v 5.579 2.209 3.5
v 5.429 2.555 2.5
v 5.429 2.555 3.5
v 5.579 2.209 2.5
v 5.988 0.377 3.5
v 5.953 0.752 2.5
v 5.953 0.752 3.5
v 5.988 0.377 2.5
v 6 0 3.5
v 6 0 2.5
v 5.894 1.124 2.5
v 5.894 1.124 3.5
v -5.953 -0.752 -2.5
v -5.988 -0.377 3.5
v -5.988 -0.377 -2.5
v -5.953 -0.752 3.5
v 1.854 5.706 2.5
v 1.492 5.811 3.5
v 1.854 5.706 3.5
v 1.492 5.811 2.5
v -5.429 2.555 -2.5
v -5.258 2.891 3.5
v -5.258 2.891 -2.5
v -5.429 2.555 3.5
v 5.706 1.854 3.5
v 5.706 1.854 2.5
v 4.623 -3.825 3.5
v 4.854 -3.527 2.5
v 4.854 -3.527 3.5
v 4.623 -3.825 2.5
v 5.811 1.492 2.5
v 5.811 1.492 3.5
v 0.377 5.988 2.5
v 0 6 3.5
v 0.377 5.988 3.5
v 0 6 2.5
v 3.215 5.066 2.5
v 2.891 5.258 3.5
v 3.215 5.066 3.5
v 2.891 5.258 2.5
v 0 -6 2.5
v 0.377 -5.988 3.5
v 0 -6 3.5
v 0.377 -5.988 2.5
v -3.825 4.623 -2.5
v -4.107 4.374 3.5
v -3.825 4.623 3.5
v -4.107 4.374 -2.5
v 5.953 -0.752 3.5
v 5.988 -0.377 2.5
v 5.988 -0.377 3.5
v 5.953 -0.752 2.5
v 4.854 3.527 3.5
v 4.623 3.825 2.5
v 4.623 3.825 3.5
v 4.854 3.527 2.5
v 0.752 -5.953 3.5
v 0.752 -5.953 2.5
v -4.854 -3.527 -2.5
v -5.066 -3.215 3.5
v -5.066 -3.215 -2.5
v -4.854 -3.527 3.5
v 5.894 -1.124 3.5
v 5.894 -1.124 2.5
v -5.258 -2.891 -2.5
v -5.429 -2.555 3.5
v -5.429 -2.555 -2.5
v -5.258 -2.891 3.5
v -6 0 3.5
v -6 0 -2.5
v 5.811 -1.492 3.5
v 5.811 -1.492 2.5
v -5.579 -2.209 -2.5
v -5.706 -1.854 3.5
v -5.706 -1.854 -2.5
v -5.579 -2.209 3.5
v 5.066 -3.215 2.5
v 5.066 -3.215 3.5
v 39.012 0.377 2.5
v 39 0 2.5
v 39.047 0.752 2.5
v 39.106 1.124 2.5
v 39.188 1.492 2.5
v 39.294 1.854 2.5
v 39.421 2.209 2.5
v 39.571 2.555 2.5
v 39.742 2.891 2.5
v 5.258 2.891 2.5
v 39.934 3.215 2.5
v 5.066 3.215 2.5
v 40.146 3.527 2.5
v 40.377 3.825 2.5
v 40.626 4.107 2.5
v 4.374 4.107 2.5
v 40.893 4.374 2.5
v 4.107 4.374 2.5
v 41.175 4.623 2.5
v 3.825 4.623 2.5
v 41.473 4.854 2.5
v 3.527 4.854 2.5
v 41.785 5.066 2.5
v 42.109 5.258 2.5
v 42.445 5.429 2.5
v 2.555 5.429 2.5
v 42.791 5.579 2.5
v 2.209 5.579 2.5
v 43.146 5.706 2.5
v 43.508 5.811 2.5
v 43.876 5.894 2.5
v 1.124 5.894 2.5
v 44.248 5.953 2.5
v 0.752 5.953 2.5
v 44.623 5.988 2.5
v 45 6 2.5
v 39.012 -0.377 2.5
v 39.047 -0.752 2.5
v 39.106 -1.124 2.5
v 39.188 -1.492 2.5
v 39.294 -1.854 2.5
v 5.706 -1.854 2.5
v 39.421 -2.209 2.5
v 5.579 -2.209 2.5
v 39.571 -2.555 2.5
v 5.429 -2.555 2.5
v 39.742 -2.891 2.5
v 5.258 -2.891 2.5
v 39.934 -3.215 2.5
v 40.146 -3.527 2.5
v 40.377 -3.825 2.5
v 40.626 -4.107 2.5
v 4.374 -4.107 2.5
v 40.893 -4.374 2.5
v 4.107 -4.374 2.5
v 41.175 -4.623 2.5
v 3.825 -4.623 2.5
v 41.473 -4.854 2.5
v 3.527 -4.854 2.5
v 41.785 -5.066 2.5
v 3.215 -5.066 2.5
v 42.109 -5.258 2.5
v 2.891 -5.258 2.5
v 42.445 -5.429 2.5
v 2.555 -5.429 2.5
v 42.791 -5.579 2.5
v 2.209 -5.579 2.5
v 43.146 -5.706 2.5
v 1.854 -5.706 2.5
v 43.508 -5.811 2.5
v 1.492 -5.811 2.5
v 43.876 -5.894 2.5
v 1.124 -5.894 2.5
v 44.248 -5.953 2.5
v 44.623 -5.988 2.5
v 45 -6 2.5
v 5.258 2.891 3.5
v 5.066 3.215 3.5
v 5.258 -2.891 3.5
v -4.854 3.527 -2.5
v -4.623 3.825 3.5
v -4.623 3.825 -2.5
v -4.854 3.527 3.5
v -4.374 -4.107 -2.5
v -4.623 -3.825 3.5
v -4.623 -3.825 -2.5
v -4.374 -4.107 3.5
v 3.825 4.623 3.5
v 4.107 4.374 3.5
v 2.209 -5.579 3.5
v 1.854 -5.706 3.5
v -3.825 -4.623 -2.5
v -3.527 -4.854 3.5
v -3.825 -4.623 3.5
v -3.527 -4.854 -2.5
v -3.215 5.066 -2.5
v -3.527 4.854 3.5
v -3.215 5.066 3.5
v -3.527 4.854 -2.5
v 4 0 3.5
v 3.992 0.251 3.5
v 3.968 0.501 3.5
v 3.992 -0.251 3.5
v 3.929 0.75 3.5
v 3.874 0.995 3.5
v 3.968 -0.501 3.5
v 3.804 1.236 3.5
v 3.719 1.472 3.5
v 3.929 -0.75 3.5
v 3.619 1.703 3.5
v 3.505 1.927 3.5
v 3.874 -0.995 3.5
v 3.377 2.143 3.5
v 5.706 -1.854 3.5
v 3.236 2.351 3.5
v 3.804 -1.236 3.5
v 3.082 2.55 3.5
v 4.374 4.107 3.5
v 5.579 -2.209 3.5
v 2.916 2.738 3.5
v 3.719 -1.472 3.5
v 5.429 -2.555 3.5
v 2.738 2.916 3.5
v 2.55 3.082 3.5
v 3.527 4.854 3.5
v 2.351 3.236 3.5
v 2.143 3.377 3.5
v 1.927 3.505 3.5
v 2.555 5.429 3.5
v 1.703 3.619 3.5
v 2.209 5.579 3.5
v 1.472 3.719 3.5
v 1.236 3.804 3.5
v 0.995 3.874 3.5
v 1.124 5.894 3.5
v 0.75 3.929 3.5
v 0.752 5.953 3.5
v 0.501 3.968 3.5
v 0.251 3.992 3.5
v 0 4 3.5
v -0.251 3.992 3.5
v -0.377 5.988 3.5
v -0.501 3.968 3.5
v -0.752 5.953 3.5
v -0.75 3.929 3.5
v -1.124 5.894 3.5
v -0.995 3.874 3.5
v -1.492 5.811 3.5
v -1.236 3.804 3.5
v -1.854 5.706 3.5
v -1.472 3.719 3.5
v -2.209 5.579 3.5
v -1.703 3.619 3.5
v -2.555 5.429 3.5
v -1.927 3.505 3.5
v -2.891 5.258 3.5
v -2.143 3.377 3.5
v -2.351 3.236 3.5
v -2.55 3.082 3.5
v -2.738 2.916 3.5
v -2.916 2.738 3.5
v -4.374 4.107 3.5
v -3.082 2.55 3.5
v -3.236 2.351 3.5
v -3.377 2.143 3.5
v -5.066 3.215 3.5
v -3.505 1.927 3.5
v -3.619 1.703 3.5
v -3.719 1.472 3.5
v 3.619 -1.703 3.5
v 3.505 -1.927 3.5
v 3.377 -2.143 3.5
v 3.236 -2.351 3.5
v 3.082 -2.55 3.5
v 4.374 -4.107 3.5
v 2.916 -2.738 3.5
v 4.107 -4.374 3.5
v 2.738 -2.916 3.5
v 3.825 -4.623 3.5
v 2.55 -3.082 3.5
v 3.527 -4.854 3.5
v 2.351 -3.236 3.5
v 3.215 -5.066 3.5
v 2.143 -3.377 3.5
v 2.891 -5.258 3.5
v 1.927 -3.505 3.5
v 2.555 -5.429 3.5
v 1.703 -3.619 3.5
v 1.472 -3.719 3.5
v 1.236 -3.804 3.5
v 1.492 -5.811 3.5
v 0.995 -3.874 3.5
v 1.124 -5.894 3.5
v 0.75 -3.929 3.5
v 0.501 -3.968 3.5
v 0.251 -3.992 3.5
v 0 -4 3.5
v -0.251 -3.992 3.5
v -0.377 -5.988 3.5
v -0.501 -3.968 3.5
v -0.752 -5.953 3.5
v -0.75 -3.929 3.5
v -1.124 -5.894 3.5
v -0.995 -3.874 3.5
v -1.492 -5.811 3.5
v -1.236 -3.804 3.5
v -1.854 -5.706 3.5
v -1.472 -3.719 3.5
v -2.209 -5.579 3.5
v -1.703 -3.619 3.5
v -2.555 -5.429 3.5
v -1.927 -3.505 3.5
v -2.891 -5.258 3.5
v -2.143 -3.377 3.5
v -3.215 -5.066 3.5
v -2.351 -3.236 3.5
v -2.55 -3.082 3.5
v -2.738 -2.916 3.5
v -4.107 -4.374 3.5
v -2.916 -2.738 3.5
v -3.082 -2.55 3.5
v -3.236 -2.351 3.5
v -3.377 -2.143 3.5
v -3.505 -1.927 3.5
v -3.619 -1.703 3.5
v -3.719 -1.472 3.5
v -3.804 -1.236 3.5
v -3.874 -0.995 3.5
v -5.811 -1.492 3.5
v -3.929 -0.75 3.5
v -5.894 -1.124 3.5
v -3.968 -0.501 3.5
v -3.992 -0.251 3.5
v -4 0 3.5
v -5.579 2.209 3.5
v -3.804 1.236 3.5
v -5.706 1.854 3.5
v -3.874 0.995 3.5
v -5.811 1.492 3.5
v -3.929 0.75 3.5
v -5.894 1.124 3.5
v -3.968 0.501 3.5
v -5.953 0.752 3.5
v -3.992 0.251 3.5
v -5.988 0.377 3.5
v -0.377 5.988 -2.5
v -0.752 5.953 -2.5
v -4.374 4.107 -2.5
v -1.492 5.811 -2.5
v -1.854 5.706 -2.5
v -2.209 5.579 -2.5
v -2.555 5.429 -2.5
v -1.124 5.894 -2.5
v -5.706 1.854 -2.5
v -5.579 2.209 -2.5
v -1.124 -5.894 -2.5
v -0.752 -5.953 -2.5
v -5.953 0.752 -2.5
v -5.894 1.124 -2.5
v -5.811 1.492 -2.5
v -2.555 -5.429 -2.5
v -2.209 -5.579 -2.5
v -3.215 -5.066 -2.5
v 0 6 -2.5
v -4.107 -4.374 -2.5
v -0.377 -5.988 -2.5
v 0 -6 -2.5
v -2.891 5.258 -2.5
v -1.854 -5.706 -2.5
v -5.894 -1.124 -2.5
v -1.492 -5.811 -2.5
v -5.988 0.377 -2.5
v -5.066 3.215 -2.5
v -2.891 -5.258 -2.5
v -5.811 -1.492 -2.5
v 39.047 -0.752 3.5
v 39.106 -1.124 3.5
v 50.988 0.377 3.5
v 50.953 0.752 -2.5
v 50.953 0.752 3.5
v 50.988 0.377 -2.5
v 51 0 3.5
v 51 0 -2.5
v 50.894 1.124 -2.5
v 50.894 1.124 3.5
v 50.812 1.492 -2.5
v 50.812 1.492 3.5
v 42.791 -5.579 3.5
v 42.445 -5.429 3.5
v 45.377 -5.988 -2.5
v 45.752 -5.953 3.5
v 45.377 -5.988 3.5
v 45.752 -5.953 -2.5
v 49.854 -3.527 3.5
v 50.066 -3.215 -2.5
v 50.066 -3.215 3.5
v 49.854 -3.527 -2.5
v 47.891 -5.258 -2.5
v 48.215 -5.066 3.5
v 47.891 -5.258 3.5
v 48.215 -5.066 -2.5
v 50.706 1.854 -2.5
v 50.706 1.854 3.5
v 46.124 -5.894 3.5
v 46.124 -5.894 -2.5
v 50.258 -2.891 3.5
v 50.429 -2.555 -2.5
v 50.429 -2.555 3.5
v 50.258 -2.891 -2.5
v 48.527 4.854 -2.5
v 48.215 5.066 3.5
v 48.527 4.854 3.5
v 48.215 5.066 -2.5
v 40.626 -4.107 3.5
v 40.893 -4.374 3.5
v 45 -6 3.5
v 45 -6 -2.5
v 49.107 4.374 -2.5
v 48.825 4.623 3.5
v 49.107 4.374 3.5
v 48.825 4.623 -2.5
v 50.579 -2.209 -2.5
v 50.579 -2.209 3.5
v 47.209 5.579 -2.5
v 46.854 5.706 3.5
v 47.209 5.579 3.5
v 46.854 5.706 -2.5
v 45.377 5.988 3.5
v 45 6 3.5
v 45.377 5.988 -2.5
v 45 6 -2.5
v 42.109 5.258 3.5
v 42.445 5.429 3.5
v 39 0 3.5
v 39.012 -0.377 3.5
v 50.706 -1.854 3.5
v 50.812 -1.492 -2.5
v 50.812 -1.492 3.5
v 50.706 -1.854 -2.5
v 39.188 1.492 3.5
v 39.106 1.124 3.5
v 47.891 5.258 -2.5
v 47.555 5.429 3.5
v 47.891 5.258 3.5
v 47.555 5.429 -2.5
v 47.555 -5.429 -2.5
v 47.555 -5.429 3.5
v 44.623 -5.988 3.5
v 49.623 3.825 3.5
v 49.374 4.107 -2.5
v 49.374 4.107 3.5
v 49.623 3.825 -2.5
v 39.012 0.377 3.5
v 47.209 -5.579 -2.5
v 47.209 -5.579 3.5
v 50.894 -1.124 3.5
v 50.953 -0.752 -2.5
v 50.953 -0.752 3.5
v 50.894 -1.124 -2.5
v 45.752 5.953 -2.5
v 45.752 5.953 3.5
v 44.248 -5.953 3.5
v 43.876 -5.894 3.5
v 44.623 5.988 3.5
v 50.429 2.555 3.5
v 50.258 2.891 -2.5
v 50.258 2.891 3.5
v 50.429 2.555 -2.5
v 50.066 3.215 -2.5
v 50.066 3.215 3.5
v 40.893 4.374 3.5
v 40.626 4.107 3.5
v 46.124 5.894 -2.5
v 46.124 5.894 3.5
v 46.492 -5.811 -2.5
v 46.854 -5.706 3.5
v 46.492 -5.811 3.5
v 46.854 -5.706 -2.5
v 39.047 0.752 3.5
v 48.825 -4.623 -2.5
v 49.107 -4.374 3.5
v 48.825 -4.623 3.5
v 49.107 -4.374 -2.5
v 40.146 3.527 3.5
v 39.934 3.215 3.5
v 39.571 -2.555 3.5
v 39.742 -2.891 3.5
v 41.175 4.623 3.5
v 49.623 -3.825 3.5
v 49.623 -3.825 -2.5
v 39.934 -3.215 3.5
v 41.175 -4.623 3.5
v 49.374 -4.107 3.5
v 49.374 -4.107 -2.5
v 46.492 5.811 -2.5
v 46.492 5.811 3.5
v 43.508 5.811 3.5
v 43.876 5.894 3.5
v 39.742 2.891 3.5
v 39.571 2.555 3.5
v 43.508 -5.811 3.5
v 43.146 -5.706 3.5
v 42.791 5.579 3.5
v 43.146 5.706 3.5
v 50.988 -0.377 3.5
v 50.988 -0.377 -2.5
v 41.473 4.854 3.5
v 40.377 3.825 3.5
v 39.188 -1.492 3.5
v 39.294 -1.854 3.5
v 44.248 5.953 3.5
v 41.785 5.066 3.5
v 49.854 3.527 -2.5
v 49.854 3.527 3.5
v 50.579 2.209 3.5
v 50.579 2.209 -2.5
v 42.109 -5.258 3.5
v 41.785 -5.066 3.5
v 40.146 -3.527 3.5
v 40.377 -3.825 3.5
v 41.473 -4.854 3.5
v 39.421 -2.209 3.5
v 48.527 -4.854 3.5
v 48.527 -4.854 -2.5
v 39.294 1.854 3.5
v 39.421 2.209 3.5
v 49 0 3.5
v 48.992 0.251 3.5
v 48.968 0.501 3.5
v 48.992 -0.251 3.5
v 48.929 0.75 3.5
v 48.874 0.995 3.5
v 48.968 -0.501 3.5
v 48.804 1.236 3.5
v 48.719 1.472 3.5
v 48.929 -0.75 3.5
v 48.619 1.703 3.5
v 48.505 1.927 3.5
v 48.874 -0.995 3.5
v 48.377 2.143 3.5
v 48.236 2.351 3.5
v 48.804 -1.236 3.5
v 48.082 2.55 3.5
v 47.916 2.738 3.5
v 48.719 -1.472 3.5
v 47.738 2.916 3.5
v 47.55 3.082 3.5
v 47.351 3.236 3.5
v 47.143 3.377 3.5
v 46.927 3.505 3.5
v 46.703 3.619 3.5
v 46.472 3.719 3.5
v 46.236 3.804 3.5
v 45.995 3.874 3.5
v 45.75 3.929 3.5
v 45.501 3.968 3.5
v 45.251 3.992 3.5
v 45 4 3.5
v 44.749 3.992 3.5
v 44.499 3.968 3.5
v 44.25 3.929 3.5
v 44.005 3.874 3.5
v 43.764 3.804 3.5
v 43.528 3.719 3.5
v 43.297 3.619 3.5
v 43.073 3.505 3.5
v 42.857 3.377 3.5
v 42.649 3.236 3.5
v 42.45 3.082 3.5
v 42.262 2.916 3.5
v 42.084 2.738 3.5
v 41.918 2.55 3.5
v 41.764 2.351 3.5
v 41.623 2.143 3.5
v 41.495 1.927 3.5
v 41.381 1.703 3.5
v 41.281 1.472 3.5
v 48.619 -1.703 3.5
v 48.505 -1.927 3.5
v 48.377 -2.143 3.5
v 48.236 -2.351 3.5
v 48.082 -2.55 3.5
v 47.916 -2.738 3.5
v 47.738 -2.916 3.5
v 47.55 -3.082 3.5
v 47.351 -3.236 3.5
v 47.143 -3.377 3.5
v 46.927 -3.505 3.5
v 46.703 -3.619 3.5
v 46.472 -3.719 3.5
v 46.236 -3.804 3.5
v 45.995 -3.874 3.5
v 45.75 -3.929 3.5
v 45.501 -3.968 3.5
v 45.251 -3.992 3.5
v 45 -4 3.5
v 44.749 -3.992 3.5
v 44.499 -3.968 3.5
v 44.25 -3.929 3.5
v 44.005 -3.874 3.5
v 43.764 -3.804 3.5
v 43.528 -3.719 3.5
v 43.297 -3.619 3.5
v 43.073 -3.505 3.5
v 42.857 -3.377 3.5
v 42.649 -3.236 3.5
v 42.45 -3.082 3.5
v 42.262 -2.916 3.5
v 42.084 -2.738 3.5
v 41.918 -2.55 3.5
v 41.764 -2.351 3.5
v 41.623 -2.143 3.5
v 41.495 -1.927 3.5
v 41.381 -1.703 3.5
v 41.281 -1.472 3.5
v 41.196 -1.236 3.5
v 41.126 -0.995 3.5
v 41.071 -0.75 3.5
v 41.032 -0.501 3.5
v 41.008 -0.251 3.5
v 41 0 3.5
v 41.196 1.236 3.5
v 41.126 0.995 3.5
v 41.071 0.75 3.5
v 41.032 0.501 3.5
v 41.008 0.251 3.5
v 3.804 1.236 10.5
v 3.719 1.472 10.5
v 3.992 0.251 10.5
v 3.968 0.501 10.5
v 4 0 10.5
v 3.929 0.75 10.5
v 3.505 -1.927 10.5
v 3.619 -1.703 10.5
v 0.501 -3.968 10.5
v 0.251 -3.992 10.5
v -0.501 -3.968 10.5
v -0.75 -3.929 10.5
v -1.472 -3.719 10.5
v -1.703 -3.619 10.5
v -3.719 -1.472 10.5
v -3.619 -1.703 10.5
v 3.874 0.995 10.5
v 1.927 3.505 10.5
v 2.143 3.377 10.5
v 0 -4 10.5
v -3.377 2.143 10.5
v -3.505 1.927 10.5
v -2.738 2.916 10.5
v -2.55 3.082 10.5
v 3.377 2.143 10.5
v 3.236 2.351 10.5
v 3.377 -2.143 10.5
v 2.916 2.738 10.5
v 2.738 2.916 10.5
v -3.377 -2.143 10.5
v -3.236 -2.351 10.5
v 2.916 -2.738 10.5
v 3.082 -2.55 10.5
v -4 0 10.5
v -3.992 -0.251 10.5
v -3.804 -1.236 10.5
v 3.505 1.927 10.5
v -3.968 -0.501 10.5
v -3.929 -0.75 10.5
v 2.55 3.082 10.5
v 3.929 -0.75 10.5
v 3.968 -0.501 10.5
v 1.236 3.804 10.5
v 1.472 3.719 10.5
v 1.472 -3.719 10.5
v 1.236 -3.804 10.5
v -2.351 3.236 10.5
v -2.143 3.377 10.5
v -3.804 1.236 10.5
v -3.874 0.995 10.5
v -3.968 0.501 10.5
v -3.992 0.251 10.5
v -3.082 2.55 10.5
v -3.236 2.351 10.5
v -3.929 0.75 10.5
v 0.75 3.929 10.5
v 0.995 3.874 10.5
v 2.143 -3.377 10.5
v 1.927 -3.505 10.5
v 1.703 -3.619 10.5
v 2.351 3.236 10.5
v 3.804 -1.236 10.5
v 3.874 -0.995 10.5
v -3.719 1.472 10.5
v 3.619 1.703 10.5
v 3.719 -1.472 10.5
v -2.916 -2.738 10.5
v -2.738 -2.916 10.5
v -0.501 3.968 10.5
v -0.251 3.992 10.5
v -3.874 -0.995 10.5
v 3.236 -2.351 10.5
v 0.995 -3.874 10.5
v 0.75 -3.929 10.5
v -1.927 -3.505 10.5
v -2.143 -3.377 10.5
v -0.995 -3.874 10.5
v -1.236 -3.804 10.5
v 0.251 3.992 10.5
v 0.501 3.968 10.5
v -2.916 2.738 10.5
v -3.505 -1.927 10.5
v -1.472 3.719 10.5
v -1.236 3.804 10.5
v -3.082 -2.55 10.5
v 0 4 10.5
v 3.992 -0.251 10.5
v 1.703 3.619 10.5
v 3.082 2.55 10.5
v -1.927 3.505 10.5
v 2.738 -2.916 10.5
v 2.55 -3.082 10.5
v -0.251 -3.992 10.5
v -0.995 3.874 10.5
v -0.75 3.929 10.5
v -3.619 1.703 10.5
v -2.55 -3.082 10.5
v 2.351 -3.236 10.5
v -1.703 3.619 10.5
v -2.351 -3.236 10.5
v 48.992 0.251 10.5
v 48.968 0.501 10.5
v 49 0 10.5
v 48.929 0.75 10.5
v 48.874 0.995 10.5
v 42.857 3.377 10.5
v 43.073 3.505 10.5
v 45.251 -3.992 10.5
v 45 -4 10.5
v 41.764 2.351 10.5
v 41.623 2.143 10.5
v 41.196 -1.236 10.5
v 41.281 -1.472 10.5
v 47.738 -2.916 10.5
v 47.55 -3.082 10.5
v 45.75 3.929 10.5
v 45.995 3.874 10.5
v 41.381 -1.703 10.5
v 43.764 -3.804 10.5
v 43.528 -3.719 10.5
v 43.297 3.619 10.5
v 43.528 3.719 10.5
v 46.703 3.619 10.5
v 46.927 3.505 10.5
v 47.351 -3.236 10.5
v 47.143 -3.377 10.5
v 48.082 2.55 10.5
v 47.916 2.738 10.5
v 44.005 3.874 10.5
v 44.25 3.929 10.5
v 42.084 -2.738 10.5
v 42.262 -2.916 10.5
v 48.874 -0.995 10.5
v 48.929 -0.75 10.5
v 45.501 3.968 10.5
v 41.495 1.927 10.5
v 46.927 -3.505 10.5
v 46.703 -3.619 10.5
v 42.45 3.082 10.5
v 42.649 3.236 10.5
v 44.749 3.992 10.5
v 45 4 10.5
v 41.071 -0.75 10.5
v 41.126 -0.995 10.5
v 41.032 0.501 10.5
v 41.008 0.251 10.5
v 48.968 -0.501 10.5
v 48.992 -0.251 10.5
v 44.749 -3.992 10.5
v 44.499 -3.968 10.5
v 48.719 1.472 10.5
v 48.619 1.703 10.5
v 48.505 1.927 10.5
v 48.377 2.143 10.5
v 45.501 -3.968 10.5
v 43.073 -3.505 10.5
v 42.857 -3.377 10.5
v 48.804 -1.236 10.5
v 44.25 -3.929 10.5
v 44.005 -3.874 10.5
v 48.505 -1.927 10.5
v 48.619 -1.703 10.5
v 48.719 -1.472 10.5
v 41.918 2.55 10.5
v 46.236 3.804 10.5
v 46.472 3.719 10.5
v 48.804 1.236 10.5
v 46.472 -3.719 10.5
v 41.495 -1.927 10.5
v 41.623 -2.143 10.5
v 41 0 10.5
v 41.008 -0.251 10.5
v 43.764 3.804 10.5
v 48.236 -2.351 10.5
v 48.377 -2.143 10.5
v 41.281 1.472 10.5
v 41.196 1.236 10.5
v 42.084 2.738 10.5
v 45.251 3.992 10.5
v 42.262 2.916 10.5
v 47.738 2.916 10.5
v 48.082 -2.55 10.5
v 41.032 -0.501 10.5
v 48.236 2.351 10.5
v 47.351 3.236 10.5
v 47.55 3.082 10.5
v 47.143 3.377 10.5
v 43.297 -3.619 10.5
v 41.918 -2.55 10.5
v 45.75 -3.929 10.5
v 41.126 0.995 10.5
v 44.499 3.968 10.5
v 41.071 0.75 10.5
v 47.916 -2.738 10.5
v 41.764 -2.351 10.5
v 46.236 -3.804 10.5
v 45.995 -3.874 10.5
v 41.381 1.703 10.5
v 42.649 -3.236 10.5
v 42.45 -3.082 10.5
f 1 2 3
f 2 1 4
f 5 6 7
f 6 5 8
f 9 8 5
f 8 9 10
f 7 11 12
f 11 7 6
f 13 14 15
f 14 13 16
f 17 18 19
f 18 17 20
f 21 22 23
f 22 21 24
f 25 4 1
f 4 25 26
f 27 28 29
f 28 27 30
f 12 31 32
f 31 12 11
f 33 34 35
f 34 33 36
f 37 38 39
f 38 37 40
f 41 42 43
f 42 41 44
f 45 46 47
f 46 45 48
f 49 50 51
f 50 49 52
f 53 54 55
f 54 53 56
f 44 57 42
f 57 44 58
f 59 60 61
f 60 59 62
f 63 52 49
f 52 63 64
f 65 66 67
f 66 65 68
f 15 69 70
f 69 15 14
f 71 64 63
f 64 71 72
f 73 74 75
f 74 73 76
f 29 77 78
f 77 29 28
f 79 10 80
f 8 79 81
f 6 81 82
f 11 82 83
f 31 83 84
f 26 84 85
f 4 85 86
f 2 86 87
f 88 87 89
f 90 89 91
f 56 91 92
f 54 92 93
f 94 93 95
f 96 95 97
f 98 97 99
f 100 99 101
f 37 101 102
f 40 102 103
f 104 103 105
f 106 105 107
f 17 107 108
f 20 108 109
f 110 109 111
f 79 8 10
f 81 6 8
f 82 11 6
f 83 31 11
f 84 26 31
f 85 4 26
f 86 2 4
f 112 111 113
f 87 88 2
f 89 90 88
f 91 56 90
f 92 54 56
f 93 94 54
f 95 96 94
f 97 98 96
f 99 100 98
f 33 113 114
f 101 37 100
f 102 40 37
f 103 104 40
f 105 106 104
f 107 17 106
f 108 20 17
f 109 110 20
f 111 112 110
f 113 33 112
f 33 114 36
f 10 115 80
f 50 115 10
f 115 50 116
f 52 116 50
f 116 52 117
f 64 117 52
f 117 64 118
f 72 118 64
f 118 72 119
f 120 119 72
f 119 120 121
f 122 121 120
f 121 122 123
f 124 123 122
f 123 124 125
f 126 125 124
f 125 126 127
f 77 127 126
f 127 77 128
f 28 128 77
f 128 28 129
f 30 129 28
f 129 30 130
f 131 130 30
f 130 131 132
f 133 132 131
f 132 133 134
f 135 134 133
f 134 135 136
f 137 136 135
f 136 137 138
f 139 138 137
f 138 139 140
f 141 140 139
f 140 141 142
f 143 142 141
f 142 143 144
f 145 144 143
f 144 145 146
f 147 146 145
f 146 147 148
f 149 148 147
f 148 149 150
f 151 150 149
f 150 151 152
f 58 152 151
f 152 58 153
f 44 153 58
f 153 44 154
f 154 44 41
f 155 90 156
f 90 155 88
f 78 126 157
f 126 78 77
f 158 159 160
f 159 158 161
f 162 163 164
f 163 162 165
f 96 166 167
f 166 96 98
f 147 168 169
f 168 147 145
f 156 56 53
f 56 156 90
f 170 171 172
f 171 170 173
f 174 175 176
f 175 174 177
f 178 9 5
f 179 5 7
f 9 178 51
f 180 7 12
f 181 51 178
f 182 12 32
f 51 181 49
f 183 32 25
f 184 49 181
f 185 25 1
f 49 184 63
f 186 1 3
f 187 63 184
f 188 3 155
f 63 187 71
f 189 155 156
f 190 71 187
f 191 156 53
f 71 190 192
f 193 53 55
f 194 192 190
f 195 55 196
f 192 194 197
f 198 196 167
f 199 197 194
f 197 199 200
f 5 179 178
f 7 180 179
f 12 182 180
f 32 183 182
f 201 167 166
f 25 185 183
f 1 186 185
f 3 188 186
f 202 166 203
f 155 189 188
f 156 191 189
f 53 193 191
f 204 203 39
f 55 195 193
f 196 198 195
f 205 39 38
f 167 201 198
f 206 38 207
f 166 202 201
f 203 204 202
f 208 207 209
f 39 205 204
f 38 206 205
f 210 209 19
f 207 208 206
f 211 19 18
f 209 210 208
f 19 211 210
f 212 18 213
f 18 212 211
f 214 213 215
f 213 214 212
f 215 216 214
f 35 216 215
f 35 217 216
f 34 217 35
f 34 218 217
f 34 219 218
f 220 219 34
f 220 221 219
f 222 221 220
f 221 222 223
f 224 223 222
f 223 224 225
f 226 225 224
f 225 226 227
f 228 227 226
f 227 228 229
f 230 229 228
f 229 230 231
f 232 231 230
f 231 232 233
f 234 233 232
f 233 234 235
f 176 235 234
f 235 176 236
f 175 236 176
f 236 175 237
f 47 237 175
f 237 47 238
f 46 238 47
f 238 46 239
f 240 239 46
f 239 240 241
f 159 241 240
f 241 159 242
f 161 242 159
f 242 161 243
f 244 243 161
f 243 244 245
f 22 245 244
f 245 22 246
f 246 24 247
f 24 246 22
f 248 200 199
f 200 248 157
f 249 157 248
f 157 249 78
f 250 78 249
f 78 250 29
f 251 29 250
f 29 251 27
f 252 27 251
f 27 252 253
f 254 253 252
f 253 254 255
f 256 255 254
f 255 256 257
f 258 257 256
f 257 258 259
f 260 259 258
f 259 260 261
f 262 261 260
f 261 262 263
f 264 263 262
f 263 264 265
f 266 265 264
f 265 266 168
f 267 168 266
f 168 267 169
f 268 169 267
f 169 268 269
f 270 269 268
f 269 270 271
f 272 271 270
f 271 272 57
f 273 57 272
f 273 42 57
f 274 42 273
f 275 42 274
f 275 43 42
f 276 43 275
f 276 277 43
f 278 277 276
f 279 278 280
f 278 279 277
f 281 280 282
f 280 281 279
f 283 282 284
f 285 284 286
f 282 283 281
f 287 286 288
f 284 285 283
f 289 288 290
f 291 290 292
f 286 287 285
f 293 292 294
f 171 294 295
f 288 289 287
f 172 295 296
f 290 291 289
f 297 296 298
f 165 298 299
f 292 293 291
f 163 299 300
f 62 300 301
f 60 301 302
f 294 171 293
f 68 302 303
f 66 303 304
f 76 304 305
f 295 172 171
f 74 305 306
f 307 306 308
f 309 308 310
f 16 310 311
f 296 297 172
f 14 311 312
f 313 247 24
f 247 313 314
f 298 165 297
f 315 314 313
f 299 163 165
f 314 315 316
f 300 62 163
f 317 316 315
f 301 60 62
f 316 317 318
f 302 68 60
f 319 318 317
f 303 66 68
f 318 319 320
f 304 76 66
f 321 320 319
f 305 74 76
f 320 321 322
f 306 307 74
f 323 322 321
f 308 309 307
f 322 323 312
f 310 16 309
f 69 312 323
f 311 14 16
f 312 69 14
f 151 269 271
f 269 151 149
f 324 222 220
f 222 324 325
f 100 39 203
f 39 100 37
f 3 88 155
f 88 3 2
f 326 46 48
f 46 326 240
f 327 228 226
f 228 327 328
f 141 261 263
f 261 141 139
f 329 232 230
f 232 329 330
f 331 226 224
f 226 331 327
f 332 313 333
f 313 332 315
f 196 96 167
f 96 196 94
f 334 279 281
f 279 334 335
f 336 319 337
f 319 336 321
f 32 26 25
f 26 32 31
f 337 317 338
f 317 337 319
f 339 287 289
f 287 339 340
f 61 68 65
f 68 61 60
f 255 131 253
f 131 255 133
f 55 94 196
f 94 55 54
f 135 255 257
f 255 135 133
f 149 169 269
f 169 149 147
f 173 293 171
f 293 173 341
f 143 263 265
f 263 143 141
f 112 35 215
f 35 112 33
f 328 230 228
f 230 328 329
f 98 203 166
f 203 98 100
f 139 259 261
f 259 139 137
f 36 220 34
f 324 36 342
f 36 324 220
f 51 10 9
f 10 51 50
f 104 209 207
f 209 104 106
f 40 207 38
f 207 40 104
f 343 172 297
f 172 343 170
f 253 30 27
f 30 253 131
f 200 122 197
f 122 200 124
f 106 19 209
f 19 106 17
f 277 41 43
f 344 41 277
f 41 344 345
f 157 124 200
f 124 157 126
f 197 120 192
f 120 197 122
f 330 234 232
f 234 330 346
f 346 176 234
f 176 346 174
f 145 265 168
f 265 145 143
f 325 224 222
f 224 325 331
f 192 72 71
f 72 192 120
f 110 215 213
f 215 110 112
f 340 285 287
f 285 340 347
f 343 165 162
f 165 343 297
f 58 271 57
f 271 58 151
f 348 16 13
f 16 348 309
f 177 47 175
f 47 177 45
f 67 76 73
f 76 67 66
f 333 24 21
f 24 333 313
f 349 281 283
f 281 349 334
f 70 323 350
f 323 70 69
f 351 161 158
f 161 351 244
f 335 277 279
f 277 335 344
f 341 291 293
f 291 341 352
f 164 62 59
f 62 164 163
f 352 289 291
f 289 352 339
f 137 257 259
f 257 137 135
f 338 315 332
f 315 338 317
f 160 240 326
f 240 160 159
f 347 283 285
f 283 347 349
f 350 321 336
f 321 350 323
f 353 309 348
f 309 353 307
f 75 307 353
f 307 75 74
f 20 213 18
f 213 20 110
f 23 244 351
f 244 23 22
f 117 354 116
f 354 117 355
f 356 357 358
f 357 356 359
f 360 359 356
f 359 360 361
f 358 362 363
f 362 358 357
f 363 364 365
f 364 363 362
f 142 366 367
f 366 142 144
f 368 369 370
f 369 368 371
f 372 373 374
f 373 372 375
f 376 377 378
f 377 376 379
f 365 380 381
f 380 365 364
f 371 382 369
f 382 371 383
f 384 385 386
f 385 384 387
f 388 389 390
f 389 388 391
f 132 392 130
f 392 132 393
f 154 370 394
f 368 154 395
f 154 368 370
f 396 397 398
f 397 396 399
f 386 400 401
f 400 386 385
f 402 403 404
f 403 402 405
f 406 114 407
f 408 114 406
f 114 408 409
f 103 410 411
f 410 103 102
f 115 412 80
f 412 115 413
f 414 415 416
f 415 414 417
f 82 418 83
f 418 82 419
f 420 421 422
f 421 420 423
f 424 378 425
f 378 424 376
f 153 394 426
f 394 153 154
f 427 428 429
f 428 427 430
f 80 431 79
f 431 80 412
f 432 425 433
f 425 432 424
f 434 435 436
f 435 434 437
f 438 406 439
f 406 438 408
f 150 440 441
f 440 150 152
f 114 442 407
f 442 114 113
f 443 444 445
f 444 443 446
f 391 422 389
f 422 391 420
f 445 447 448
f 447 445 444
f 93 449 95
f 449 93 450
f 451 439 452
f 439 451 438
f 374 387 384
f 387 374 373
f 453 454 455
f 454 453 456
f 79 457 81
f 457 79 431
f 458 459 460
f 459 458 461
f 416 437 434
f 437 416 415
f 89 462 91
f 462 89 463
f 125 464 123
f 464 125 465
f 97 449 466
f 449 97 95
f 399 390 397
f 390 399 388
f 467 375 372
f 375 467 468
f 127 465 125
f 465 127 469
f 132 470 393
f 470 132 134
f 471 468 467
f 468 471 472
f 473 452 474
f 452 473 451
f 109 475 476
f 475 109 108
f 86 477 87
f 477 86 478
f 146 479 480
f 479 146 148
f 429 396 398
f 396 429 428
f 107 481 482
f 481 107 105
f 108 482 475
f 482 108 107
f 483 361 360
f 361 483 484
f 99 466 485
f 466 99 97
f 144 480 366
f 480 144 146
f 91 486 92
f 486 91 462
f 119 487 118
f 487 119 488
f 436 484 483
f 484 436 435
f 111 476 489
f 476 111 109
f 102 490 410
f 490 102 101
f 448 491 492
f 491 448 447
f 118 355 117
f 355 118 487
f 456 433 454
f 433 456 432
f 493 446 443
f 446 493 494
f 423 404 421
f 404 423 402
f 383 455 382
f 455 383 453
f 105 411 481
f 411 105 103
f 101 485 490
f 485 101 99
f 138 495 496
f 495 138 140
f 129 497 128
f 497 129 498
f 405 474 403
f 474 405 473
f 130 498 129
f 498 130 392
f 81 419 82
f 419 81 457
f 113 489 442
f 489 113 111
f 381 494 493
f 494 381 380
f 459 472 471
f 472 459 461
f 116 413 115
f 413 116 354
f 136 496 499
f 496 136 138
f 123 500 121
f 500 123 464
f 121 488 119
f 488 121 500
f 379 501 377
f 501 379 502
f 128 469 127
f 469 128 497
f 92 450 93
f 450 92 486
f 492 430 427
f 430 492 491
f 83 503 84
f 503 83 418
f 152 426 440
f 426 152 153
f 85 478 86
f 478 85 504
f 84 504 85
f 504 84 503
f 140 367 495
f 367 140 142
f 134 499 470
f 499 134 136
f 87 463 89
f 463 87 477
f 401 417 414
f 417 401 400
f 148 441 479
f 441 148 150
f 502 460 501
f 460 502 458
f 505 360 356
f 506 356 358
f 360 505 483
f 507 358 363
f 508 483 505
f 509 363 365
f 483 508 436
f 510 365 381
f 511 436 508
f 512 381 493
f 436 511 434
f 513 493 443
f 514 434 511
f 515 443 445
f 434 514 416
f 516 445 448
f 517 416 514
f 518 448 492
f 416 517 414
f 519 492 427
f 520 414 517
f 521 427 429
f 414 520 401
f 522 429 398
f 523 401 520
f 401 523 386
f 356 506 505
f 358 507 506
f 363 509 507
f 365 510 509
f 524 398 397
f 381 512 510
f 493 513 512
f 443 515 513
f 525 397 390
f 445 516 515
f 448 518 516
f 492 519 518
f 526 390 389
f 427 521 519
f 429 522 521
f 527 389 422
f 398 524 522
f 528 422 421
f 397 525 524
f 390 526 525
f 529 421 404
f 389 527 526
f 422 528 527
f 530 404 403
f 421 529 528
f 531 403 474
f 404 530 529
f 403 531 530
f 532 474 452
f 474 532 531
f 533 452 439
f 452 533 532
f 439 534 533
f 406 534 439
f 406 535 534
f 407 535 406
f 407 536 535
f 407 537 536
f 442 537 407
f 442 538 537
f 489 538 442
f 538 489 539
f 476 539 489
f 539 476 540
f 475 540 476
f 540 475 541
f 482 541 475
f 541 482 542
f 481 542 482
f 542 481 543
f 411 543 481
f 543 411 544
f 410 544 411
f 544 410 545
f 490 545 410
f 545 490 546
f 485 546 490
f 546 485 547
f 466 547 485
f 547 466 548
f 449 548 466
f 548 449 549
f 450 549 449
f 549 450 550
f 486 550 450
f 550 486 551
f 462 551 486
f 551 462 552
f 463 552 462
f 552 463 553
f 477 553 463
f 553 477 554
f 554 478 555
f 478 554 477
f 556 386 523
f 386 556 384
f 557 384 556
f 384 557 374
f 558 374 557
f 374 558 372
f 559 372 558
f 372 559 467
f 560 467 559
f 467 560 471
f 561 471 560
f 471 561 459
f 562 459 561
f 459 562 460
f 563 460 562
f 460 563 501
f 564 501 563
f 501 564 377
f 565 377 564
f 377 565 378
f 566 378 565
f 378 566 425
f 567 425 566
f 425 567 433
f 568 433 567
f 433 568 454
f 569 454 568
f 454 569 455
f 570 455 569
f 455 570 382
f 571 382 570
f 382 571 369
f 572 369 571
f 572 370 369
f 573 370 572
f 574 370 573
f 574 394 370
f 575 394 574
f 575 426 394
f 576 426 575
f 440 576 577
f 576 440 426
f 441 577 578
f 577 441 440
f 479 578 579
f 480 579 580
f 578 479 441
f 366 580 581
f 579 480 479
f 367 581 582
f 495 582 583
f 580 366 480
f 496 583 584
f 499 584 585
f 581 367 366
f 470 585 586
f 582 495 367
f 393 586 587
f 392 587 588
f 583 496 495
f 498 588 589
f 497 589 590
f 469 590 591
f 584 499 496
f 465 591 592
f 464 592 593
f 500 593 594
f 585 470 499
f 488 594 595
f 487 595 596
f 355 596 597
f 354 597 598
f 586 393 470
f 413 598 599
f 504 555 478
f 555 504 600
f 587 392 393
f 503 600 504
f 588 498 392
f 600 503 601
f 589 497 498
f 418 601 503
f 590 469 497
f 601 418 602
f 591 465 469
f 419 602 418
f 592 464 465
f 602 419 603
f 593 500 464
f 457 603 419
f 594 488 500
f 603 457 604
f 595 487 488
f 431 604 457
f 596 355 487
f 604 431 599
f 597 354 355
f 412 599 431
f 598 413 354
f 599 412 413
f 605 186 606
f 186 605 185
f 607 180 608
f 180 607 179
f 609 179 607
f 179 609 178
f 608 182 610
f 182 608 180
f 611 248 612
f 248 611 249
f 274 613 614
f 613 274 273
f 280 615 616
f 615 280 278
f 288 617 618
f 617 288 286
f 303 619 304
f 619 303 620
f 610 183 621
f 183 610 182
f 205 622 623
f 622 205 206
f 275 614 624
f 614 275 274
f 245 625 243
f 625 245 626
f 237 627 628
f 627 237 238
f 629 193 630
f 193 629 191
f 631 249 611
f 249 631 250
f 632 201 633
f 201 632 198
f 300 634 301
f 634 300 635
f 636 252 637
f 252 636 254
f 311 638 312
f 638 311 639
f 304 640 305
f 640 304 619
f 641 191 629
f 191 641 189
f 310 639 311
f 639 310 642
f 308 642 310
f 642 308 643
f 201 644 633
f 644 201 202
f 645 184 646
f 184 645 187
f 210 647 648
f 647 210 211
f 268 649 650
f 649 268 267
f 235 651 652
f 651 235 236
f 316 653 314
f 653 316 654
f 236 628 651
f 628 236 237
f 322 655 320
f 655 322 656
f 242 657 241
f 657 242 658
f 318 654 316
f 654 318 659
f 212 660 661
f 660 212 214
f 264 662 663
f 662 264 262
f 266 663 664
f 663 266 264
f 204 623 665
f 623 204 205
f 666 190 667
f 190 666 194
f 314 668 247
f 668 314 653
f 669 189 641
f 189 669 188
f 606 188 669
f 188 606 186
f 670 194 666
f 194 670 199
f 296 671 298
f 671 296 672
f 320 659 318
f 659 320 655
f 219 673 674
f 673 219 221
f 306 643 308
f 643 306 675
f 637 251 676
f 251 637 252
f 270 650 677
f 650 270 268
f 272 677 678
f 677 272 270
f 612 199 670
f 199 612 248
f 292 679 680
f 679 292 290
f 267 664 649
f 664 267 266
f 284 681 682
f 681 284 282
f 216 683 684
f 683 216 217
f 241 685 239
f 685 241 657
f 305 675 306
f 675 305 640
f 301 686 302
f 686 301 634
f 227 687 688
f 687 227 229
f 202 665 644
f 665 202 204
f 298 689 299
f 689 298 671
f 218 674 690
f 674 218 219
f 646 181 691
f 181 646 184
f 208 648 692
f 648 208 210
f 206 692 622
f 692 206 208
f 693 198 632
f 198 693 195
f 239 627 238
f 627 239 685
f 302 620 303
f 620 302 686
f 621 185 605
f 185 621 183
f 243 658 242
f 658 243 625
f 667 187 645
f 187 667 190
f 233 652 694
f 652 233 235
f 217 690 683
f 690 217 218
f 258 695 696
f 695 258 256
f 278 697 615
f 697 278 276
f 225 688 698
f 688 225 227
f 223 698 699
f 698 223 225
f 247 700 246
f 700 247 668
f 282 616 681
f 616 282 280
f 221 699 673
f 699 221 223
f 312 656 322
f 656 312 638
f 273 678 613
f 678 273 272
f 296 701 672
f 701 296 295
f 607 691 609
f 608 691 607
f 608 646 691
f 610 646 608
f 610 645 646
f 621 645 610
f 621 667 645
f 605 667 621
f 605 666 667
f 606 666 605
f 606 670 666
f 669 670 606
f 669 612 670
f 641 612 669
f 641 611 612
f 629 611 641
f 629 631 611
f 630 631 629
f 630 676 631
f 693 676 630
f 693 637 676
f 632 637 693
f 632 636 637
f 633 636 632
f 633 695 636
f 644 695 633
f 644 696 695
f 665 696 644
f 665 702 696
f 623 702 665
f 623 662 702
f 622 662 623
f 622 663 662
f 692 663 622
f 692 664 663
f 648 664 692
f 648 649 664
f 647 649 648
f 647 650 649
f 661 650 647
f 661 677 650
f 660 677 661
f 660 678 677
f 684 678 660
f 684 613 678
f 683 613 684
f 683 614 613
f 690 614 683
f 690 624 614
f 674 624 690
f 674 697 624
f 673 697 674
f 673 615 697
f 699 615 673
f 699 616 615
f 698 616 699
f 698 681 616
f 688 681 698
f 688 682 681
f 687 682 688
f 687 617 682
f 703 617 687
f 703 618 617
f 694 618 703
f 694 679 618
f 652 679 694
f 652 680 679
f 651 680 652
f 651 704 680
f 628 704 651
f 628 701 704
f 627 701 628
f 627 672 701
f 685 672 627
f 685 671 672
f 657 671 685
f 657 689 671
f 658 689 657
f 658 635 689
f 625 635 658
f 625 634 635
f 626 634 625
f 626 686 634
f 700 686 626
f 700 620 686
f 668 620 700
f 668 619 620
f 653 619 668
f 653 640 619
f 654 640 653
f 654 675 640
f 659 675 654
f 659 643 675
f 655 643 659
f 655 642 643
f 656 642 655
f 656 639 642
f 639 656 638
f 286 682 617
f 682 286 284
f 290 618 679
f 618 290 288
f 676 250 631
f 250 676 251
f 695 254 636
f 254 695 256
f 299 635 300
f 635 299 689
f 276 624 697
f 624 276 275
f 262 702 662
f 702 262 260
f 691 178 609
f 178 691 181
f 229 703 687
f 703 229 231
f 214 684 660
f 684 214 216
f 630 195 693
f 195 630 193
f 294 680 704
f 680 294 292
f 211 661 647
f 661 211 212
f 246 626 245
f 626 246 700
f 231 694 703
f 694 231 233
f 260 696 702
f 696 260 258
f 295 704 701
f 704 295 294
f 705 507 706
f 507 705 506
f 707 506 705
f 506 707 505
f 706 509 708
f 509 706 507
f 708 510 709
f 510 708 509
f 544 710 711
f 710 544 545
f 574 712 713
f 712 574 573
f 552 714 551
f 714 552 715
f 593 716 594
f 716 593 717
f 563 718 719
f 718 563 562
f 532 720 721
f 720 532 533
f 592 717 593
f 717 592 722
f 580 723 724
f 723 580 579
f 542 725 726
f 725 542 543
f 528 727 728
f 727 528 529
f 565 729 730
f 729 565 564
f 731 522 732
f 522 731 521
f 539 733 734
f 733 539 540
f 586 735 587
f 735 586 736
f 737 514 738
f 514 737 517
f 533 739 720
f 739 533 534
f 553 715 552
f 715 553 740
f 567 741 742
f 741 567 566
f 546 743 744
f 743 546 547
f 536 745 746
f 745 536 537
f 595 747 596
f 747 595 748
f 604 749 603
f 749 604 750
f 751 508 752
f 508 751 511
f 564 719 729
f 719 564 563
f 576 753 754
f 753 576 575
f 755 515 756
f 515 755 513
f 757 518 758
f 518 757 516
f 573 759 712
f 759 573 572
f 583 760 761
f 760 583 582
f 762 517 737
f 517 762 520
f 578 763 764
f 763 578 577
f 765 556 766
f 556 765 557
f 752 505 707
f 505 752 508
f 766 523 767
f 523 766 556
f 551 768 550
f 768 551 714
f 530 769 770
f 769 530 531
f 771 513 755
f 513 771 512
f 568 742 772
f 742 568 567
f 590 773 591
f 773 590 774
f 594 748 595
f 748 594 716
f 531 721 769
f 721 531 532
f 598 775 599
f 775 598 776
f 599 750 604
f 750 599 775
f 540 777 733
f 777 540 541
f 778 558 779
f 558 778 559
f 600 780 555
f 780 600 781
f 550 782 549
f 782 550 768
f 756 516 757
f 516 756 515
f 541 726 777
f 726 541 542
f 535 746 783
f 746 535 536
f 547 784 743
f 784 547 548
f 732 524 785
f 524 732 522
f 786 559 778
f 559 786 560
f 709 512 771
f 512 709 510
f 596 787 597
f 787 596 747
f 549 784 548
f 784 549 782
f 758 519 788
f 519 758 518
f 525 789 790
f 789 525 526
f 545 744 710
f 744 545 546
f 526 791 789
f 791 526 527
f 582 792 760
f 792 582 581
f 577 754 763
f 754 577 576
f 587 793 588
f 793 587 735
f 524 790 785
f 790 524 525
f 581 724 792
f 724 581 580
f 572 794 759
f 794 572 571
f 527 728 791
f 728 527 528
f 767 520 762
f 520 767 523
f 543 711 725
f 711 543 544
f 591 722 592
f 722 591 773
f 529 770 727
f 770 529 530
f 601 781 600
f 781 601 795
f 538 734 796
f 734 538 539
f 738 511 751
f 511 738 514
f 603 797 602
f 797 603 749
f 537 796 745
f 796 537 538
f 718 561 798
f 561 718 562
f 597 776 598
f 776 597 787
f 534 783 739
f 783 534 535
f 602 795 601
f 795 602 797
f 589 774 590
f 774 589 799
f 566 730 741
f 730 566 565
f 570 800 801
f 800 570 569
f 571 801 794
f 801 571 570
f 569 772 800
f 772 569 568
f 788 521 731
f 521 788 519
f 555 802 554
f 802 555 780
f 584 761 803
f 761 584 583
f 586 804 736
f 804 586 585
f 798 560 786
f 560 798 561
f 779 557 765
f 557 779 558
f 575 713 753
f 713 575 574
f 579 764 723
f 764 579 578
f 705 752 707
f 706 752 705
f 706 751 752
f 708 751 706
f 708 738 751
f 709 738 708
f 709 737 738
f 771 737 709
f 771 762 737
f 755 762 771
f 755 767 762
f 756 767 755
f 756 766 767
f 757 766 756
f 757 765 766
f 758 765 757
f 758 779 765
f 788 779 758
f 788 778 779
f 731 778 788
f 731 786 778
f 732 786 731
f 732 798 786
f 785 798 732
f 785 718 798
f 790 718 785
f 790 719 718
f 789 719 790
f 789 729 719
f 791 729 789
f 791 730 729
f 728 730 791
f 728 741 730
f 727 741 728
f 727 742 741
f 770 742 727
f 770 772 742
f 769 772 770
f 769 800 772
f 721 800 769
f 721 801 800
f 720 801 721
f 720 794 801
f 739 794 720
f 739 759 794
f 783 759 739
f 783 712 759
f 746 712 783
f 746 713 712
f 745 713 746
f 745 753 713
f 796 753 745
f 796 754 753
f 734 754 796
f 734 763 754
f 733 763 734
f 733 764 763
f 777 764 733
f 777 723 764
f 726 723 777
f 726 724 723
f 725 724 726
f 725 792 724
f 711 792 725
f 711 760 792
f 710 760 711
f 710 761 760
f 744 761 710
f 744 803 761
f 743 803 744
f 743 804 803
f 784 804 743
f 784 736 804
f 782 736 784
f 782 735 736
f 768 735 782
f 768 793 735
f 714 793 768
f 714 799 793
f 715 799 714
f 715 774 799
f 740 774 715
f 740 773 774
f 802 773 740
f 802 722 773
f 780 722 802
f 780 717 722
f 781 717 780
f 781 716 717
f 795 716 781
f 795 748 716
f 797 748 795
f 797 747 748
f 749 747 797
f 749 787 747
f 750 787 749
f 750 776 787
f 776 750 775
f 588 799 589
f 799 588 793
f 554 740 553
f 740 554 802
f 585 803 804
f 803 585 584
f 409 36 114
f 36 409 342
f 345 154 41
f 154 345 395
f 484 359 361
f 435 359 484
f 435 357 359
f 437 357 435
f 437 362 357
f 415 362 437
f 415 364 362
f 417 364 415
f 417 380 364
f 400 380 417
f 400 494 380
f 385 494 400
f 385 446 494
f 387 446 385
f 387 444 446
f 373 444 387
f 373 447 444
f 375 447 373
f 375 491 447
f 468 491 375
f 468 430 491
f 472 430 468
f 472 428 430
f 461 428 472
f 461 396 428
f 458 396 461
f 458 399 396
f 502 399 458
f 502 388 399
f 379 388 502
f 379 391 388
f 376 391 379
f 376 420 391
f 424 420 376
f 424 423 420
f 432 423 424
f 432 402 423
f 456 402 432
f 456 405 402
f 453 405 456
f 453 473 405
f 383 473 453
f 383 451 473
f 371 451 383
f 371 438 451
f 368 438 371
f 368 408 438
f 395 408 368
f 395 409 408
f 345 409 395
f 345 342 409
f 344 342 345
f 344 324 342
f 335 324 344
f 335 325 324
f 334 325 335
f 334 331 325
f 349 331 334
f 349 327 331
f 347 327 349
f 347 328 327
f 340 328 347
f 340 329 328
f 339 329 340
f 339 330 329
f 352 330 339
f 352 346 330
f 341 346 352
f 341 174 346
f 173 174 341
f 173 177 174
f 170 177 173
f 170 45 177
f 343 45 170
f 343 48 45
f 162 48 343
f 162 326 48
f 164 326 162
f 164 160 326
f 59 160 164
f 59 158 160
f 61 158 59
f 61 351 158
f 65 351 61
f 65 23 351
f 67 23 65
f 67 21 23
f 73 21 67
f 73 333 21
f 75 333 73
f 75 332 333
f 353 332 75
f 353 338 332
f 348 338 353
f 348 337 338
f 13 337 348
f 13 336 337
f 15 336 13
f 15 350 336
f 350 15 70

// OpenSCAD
// ==========================================
// 1. KONFIGURACJA TESTERA (Parametry)
// ==========================================
// Moduł
m = 1;  
// Liczba zębów pierwszej zębatki
z1 = 60;         
// Liczba zębów drugiej zębatki
z2 = 30;            

// Średnica trzpienia
s_o = 8;       
// Wysokość trzpienia
h_o = 7;      
// Grubość płyty podstawy
h_p = 5;            

// Szerokość kołnierza (podkładki)
s_po = 2;           
// Wysokość podkładki
h_po = 1;           

// Gładkość okręgów
$fn = 100;          

// ==========================================
// 2. OBLICZENIA GEOMETRYCZNE
// ==========================================
r_z1 = (z1 * m) / 2; 
r_z2 = (z2 * m) / 2; 
r_o  = s_o / 2;      
r_kolnierza = r_o + s_po; 

// Rozstaw osi: suma promieni podziałowych
odleglosc_osiowa = r_z1 + r_z2; 

// Obliczenia pozycji Z (naprawione nazwy bez polskich znaków)
poz_z_podkladki = (h_p / 2) + (h_po / 2);
// Trzpień musi być przesunięty o połowę grubości podstawy + całą podkładkę + połowę swojej wysokości
poz_z_trzpienia = (h_p / 2) + h_po + (h_o / 2);

// ==========================================
// 3. MODUŁ PODSTAWY TESTOWEJ
// ==========================================
module tester_zebatek() {
    
    // --- PŁYTA GŁÓWNA (Podstawa) ---
    hull() {
        translate([0, 0, 0])
            cylinder(h = h_p, r = r_kolnierza, center = true);
        
        translate([odleglosc_osiowa, 0, 0])
            cylinder(h = h_p, r = r_kolnierza, center = true);
    }

    // --- PODKŁADKI DYSTANSOWE ---
    union() {
        translate([0, 0, poz_z_podkladki])
            cylinder(h = h_po, r = r_kolnierza, center = true);

        translate([odleglosc_osiowa, 0, poz_z_podkladki])
            cylinder(h = h_po, r = r_kolnierza, center = true);
    }

    // --- TRZPIENIE (OSIE MONTAŻOWE) ---
    union() {
        translate([0, 0, poz_z_trzpienia])
            cylinder(h = h_o, r = r_o, center = true);

        translate([odleglosc_osiowa, 0, poz_z_trzpienia])
            cylinder(h = h_o, r = r_o, center = true);
    }
}

// ==========================================
// 4. WYWOŁANIE MODELU
// ==========================================
tester_zebatek();
